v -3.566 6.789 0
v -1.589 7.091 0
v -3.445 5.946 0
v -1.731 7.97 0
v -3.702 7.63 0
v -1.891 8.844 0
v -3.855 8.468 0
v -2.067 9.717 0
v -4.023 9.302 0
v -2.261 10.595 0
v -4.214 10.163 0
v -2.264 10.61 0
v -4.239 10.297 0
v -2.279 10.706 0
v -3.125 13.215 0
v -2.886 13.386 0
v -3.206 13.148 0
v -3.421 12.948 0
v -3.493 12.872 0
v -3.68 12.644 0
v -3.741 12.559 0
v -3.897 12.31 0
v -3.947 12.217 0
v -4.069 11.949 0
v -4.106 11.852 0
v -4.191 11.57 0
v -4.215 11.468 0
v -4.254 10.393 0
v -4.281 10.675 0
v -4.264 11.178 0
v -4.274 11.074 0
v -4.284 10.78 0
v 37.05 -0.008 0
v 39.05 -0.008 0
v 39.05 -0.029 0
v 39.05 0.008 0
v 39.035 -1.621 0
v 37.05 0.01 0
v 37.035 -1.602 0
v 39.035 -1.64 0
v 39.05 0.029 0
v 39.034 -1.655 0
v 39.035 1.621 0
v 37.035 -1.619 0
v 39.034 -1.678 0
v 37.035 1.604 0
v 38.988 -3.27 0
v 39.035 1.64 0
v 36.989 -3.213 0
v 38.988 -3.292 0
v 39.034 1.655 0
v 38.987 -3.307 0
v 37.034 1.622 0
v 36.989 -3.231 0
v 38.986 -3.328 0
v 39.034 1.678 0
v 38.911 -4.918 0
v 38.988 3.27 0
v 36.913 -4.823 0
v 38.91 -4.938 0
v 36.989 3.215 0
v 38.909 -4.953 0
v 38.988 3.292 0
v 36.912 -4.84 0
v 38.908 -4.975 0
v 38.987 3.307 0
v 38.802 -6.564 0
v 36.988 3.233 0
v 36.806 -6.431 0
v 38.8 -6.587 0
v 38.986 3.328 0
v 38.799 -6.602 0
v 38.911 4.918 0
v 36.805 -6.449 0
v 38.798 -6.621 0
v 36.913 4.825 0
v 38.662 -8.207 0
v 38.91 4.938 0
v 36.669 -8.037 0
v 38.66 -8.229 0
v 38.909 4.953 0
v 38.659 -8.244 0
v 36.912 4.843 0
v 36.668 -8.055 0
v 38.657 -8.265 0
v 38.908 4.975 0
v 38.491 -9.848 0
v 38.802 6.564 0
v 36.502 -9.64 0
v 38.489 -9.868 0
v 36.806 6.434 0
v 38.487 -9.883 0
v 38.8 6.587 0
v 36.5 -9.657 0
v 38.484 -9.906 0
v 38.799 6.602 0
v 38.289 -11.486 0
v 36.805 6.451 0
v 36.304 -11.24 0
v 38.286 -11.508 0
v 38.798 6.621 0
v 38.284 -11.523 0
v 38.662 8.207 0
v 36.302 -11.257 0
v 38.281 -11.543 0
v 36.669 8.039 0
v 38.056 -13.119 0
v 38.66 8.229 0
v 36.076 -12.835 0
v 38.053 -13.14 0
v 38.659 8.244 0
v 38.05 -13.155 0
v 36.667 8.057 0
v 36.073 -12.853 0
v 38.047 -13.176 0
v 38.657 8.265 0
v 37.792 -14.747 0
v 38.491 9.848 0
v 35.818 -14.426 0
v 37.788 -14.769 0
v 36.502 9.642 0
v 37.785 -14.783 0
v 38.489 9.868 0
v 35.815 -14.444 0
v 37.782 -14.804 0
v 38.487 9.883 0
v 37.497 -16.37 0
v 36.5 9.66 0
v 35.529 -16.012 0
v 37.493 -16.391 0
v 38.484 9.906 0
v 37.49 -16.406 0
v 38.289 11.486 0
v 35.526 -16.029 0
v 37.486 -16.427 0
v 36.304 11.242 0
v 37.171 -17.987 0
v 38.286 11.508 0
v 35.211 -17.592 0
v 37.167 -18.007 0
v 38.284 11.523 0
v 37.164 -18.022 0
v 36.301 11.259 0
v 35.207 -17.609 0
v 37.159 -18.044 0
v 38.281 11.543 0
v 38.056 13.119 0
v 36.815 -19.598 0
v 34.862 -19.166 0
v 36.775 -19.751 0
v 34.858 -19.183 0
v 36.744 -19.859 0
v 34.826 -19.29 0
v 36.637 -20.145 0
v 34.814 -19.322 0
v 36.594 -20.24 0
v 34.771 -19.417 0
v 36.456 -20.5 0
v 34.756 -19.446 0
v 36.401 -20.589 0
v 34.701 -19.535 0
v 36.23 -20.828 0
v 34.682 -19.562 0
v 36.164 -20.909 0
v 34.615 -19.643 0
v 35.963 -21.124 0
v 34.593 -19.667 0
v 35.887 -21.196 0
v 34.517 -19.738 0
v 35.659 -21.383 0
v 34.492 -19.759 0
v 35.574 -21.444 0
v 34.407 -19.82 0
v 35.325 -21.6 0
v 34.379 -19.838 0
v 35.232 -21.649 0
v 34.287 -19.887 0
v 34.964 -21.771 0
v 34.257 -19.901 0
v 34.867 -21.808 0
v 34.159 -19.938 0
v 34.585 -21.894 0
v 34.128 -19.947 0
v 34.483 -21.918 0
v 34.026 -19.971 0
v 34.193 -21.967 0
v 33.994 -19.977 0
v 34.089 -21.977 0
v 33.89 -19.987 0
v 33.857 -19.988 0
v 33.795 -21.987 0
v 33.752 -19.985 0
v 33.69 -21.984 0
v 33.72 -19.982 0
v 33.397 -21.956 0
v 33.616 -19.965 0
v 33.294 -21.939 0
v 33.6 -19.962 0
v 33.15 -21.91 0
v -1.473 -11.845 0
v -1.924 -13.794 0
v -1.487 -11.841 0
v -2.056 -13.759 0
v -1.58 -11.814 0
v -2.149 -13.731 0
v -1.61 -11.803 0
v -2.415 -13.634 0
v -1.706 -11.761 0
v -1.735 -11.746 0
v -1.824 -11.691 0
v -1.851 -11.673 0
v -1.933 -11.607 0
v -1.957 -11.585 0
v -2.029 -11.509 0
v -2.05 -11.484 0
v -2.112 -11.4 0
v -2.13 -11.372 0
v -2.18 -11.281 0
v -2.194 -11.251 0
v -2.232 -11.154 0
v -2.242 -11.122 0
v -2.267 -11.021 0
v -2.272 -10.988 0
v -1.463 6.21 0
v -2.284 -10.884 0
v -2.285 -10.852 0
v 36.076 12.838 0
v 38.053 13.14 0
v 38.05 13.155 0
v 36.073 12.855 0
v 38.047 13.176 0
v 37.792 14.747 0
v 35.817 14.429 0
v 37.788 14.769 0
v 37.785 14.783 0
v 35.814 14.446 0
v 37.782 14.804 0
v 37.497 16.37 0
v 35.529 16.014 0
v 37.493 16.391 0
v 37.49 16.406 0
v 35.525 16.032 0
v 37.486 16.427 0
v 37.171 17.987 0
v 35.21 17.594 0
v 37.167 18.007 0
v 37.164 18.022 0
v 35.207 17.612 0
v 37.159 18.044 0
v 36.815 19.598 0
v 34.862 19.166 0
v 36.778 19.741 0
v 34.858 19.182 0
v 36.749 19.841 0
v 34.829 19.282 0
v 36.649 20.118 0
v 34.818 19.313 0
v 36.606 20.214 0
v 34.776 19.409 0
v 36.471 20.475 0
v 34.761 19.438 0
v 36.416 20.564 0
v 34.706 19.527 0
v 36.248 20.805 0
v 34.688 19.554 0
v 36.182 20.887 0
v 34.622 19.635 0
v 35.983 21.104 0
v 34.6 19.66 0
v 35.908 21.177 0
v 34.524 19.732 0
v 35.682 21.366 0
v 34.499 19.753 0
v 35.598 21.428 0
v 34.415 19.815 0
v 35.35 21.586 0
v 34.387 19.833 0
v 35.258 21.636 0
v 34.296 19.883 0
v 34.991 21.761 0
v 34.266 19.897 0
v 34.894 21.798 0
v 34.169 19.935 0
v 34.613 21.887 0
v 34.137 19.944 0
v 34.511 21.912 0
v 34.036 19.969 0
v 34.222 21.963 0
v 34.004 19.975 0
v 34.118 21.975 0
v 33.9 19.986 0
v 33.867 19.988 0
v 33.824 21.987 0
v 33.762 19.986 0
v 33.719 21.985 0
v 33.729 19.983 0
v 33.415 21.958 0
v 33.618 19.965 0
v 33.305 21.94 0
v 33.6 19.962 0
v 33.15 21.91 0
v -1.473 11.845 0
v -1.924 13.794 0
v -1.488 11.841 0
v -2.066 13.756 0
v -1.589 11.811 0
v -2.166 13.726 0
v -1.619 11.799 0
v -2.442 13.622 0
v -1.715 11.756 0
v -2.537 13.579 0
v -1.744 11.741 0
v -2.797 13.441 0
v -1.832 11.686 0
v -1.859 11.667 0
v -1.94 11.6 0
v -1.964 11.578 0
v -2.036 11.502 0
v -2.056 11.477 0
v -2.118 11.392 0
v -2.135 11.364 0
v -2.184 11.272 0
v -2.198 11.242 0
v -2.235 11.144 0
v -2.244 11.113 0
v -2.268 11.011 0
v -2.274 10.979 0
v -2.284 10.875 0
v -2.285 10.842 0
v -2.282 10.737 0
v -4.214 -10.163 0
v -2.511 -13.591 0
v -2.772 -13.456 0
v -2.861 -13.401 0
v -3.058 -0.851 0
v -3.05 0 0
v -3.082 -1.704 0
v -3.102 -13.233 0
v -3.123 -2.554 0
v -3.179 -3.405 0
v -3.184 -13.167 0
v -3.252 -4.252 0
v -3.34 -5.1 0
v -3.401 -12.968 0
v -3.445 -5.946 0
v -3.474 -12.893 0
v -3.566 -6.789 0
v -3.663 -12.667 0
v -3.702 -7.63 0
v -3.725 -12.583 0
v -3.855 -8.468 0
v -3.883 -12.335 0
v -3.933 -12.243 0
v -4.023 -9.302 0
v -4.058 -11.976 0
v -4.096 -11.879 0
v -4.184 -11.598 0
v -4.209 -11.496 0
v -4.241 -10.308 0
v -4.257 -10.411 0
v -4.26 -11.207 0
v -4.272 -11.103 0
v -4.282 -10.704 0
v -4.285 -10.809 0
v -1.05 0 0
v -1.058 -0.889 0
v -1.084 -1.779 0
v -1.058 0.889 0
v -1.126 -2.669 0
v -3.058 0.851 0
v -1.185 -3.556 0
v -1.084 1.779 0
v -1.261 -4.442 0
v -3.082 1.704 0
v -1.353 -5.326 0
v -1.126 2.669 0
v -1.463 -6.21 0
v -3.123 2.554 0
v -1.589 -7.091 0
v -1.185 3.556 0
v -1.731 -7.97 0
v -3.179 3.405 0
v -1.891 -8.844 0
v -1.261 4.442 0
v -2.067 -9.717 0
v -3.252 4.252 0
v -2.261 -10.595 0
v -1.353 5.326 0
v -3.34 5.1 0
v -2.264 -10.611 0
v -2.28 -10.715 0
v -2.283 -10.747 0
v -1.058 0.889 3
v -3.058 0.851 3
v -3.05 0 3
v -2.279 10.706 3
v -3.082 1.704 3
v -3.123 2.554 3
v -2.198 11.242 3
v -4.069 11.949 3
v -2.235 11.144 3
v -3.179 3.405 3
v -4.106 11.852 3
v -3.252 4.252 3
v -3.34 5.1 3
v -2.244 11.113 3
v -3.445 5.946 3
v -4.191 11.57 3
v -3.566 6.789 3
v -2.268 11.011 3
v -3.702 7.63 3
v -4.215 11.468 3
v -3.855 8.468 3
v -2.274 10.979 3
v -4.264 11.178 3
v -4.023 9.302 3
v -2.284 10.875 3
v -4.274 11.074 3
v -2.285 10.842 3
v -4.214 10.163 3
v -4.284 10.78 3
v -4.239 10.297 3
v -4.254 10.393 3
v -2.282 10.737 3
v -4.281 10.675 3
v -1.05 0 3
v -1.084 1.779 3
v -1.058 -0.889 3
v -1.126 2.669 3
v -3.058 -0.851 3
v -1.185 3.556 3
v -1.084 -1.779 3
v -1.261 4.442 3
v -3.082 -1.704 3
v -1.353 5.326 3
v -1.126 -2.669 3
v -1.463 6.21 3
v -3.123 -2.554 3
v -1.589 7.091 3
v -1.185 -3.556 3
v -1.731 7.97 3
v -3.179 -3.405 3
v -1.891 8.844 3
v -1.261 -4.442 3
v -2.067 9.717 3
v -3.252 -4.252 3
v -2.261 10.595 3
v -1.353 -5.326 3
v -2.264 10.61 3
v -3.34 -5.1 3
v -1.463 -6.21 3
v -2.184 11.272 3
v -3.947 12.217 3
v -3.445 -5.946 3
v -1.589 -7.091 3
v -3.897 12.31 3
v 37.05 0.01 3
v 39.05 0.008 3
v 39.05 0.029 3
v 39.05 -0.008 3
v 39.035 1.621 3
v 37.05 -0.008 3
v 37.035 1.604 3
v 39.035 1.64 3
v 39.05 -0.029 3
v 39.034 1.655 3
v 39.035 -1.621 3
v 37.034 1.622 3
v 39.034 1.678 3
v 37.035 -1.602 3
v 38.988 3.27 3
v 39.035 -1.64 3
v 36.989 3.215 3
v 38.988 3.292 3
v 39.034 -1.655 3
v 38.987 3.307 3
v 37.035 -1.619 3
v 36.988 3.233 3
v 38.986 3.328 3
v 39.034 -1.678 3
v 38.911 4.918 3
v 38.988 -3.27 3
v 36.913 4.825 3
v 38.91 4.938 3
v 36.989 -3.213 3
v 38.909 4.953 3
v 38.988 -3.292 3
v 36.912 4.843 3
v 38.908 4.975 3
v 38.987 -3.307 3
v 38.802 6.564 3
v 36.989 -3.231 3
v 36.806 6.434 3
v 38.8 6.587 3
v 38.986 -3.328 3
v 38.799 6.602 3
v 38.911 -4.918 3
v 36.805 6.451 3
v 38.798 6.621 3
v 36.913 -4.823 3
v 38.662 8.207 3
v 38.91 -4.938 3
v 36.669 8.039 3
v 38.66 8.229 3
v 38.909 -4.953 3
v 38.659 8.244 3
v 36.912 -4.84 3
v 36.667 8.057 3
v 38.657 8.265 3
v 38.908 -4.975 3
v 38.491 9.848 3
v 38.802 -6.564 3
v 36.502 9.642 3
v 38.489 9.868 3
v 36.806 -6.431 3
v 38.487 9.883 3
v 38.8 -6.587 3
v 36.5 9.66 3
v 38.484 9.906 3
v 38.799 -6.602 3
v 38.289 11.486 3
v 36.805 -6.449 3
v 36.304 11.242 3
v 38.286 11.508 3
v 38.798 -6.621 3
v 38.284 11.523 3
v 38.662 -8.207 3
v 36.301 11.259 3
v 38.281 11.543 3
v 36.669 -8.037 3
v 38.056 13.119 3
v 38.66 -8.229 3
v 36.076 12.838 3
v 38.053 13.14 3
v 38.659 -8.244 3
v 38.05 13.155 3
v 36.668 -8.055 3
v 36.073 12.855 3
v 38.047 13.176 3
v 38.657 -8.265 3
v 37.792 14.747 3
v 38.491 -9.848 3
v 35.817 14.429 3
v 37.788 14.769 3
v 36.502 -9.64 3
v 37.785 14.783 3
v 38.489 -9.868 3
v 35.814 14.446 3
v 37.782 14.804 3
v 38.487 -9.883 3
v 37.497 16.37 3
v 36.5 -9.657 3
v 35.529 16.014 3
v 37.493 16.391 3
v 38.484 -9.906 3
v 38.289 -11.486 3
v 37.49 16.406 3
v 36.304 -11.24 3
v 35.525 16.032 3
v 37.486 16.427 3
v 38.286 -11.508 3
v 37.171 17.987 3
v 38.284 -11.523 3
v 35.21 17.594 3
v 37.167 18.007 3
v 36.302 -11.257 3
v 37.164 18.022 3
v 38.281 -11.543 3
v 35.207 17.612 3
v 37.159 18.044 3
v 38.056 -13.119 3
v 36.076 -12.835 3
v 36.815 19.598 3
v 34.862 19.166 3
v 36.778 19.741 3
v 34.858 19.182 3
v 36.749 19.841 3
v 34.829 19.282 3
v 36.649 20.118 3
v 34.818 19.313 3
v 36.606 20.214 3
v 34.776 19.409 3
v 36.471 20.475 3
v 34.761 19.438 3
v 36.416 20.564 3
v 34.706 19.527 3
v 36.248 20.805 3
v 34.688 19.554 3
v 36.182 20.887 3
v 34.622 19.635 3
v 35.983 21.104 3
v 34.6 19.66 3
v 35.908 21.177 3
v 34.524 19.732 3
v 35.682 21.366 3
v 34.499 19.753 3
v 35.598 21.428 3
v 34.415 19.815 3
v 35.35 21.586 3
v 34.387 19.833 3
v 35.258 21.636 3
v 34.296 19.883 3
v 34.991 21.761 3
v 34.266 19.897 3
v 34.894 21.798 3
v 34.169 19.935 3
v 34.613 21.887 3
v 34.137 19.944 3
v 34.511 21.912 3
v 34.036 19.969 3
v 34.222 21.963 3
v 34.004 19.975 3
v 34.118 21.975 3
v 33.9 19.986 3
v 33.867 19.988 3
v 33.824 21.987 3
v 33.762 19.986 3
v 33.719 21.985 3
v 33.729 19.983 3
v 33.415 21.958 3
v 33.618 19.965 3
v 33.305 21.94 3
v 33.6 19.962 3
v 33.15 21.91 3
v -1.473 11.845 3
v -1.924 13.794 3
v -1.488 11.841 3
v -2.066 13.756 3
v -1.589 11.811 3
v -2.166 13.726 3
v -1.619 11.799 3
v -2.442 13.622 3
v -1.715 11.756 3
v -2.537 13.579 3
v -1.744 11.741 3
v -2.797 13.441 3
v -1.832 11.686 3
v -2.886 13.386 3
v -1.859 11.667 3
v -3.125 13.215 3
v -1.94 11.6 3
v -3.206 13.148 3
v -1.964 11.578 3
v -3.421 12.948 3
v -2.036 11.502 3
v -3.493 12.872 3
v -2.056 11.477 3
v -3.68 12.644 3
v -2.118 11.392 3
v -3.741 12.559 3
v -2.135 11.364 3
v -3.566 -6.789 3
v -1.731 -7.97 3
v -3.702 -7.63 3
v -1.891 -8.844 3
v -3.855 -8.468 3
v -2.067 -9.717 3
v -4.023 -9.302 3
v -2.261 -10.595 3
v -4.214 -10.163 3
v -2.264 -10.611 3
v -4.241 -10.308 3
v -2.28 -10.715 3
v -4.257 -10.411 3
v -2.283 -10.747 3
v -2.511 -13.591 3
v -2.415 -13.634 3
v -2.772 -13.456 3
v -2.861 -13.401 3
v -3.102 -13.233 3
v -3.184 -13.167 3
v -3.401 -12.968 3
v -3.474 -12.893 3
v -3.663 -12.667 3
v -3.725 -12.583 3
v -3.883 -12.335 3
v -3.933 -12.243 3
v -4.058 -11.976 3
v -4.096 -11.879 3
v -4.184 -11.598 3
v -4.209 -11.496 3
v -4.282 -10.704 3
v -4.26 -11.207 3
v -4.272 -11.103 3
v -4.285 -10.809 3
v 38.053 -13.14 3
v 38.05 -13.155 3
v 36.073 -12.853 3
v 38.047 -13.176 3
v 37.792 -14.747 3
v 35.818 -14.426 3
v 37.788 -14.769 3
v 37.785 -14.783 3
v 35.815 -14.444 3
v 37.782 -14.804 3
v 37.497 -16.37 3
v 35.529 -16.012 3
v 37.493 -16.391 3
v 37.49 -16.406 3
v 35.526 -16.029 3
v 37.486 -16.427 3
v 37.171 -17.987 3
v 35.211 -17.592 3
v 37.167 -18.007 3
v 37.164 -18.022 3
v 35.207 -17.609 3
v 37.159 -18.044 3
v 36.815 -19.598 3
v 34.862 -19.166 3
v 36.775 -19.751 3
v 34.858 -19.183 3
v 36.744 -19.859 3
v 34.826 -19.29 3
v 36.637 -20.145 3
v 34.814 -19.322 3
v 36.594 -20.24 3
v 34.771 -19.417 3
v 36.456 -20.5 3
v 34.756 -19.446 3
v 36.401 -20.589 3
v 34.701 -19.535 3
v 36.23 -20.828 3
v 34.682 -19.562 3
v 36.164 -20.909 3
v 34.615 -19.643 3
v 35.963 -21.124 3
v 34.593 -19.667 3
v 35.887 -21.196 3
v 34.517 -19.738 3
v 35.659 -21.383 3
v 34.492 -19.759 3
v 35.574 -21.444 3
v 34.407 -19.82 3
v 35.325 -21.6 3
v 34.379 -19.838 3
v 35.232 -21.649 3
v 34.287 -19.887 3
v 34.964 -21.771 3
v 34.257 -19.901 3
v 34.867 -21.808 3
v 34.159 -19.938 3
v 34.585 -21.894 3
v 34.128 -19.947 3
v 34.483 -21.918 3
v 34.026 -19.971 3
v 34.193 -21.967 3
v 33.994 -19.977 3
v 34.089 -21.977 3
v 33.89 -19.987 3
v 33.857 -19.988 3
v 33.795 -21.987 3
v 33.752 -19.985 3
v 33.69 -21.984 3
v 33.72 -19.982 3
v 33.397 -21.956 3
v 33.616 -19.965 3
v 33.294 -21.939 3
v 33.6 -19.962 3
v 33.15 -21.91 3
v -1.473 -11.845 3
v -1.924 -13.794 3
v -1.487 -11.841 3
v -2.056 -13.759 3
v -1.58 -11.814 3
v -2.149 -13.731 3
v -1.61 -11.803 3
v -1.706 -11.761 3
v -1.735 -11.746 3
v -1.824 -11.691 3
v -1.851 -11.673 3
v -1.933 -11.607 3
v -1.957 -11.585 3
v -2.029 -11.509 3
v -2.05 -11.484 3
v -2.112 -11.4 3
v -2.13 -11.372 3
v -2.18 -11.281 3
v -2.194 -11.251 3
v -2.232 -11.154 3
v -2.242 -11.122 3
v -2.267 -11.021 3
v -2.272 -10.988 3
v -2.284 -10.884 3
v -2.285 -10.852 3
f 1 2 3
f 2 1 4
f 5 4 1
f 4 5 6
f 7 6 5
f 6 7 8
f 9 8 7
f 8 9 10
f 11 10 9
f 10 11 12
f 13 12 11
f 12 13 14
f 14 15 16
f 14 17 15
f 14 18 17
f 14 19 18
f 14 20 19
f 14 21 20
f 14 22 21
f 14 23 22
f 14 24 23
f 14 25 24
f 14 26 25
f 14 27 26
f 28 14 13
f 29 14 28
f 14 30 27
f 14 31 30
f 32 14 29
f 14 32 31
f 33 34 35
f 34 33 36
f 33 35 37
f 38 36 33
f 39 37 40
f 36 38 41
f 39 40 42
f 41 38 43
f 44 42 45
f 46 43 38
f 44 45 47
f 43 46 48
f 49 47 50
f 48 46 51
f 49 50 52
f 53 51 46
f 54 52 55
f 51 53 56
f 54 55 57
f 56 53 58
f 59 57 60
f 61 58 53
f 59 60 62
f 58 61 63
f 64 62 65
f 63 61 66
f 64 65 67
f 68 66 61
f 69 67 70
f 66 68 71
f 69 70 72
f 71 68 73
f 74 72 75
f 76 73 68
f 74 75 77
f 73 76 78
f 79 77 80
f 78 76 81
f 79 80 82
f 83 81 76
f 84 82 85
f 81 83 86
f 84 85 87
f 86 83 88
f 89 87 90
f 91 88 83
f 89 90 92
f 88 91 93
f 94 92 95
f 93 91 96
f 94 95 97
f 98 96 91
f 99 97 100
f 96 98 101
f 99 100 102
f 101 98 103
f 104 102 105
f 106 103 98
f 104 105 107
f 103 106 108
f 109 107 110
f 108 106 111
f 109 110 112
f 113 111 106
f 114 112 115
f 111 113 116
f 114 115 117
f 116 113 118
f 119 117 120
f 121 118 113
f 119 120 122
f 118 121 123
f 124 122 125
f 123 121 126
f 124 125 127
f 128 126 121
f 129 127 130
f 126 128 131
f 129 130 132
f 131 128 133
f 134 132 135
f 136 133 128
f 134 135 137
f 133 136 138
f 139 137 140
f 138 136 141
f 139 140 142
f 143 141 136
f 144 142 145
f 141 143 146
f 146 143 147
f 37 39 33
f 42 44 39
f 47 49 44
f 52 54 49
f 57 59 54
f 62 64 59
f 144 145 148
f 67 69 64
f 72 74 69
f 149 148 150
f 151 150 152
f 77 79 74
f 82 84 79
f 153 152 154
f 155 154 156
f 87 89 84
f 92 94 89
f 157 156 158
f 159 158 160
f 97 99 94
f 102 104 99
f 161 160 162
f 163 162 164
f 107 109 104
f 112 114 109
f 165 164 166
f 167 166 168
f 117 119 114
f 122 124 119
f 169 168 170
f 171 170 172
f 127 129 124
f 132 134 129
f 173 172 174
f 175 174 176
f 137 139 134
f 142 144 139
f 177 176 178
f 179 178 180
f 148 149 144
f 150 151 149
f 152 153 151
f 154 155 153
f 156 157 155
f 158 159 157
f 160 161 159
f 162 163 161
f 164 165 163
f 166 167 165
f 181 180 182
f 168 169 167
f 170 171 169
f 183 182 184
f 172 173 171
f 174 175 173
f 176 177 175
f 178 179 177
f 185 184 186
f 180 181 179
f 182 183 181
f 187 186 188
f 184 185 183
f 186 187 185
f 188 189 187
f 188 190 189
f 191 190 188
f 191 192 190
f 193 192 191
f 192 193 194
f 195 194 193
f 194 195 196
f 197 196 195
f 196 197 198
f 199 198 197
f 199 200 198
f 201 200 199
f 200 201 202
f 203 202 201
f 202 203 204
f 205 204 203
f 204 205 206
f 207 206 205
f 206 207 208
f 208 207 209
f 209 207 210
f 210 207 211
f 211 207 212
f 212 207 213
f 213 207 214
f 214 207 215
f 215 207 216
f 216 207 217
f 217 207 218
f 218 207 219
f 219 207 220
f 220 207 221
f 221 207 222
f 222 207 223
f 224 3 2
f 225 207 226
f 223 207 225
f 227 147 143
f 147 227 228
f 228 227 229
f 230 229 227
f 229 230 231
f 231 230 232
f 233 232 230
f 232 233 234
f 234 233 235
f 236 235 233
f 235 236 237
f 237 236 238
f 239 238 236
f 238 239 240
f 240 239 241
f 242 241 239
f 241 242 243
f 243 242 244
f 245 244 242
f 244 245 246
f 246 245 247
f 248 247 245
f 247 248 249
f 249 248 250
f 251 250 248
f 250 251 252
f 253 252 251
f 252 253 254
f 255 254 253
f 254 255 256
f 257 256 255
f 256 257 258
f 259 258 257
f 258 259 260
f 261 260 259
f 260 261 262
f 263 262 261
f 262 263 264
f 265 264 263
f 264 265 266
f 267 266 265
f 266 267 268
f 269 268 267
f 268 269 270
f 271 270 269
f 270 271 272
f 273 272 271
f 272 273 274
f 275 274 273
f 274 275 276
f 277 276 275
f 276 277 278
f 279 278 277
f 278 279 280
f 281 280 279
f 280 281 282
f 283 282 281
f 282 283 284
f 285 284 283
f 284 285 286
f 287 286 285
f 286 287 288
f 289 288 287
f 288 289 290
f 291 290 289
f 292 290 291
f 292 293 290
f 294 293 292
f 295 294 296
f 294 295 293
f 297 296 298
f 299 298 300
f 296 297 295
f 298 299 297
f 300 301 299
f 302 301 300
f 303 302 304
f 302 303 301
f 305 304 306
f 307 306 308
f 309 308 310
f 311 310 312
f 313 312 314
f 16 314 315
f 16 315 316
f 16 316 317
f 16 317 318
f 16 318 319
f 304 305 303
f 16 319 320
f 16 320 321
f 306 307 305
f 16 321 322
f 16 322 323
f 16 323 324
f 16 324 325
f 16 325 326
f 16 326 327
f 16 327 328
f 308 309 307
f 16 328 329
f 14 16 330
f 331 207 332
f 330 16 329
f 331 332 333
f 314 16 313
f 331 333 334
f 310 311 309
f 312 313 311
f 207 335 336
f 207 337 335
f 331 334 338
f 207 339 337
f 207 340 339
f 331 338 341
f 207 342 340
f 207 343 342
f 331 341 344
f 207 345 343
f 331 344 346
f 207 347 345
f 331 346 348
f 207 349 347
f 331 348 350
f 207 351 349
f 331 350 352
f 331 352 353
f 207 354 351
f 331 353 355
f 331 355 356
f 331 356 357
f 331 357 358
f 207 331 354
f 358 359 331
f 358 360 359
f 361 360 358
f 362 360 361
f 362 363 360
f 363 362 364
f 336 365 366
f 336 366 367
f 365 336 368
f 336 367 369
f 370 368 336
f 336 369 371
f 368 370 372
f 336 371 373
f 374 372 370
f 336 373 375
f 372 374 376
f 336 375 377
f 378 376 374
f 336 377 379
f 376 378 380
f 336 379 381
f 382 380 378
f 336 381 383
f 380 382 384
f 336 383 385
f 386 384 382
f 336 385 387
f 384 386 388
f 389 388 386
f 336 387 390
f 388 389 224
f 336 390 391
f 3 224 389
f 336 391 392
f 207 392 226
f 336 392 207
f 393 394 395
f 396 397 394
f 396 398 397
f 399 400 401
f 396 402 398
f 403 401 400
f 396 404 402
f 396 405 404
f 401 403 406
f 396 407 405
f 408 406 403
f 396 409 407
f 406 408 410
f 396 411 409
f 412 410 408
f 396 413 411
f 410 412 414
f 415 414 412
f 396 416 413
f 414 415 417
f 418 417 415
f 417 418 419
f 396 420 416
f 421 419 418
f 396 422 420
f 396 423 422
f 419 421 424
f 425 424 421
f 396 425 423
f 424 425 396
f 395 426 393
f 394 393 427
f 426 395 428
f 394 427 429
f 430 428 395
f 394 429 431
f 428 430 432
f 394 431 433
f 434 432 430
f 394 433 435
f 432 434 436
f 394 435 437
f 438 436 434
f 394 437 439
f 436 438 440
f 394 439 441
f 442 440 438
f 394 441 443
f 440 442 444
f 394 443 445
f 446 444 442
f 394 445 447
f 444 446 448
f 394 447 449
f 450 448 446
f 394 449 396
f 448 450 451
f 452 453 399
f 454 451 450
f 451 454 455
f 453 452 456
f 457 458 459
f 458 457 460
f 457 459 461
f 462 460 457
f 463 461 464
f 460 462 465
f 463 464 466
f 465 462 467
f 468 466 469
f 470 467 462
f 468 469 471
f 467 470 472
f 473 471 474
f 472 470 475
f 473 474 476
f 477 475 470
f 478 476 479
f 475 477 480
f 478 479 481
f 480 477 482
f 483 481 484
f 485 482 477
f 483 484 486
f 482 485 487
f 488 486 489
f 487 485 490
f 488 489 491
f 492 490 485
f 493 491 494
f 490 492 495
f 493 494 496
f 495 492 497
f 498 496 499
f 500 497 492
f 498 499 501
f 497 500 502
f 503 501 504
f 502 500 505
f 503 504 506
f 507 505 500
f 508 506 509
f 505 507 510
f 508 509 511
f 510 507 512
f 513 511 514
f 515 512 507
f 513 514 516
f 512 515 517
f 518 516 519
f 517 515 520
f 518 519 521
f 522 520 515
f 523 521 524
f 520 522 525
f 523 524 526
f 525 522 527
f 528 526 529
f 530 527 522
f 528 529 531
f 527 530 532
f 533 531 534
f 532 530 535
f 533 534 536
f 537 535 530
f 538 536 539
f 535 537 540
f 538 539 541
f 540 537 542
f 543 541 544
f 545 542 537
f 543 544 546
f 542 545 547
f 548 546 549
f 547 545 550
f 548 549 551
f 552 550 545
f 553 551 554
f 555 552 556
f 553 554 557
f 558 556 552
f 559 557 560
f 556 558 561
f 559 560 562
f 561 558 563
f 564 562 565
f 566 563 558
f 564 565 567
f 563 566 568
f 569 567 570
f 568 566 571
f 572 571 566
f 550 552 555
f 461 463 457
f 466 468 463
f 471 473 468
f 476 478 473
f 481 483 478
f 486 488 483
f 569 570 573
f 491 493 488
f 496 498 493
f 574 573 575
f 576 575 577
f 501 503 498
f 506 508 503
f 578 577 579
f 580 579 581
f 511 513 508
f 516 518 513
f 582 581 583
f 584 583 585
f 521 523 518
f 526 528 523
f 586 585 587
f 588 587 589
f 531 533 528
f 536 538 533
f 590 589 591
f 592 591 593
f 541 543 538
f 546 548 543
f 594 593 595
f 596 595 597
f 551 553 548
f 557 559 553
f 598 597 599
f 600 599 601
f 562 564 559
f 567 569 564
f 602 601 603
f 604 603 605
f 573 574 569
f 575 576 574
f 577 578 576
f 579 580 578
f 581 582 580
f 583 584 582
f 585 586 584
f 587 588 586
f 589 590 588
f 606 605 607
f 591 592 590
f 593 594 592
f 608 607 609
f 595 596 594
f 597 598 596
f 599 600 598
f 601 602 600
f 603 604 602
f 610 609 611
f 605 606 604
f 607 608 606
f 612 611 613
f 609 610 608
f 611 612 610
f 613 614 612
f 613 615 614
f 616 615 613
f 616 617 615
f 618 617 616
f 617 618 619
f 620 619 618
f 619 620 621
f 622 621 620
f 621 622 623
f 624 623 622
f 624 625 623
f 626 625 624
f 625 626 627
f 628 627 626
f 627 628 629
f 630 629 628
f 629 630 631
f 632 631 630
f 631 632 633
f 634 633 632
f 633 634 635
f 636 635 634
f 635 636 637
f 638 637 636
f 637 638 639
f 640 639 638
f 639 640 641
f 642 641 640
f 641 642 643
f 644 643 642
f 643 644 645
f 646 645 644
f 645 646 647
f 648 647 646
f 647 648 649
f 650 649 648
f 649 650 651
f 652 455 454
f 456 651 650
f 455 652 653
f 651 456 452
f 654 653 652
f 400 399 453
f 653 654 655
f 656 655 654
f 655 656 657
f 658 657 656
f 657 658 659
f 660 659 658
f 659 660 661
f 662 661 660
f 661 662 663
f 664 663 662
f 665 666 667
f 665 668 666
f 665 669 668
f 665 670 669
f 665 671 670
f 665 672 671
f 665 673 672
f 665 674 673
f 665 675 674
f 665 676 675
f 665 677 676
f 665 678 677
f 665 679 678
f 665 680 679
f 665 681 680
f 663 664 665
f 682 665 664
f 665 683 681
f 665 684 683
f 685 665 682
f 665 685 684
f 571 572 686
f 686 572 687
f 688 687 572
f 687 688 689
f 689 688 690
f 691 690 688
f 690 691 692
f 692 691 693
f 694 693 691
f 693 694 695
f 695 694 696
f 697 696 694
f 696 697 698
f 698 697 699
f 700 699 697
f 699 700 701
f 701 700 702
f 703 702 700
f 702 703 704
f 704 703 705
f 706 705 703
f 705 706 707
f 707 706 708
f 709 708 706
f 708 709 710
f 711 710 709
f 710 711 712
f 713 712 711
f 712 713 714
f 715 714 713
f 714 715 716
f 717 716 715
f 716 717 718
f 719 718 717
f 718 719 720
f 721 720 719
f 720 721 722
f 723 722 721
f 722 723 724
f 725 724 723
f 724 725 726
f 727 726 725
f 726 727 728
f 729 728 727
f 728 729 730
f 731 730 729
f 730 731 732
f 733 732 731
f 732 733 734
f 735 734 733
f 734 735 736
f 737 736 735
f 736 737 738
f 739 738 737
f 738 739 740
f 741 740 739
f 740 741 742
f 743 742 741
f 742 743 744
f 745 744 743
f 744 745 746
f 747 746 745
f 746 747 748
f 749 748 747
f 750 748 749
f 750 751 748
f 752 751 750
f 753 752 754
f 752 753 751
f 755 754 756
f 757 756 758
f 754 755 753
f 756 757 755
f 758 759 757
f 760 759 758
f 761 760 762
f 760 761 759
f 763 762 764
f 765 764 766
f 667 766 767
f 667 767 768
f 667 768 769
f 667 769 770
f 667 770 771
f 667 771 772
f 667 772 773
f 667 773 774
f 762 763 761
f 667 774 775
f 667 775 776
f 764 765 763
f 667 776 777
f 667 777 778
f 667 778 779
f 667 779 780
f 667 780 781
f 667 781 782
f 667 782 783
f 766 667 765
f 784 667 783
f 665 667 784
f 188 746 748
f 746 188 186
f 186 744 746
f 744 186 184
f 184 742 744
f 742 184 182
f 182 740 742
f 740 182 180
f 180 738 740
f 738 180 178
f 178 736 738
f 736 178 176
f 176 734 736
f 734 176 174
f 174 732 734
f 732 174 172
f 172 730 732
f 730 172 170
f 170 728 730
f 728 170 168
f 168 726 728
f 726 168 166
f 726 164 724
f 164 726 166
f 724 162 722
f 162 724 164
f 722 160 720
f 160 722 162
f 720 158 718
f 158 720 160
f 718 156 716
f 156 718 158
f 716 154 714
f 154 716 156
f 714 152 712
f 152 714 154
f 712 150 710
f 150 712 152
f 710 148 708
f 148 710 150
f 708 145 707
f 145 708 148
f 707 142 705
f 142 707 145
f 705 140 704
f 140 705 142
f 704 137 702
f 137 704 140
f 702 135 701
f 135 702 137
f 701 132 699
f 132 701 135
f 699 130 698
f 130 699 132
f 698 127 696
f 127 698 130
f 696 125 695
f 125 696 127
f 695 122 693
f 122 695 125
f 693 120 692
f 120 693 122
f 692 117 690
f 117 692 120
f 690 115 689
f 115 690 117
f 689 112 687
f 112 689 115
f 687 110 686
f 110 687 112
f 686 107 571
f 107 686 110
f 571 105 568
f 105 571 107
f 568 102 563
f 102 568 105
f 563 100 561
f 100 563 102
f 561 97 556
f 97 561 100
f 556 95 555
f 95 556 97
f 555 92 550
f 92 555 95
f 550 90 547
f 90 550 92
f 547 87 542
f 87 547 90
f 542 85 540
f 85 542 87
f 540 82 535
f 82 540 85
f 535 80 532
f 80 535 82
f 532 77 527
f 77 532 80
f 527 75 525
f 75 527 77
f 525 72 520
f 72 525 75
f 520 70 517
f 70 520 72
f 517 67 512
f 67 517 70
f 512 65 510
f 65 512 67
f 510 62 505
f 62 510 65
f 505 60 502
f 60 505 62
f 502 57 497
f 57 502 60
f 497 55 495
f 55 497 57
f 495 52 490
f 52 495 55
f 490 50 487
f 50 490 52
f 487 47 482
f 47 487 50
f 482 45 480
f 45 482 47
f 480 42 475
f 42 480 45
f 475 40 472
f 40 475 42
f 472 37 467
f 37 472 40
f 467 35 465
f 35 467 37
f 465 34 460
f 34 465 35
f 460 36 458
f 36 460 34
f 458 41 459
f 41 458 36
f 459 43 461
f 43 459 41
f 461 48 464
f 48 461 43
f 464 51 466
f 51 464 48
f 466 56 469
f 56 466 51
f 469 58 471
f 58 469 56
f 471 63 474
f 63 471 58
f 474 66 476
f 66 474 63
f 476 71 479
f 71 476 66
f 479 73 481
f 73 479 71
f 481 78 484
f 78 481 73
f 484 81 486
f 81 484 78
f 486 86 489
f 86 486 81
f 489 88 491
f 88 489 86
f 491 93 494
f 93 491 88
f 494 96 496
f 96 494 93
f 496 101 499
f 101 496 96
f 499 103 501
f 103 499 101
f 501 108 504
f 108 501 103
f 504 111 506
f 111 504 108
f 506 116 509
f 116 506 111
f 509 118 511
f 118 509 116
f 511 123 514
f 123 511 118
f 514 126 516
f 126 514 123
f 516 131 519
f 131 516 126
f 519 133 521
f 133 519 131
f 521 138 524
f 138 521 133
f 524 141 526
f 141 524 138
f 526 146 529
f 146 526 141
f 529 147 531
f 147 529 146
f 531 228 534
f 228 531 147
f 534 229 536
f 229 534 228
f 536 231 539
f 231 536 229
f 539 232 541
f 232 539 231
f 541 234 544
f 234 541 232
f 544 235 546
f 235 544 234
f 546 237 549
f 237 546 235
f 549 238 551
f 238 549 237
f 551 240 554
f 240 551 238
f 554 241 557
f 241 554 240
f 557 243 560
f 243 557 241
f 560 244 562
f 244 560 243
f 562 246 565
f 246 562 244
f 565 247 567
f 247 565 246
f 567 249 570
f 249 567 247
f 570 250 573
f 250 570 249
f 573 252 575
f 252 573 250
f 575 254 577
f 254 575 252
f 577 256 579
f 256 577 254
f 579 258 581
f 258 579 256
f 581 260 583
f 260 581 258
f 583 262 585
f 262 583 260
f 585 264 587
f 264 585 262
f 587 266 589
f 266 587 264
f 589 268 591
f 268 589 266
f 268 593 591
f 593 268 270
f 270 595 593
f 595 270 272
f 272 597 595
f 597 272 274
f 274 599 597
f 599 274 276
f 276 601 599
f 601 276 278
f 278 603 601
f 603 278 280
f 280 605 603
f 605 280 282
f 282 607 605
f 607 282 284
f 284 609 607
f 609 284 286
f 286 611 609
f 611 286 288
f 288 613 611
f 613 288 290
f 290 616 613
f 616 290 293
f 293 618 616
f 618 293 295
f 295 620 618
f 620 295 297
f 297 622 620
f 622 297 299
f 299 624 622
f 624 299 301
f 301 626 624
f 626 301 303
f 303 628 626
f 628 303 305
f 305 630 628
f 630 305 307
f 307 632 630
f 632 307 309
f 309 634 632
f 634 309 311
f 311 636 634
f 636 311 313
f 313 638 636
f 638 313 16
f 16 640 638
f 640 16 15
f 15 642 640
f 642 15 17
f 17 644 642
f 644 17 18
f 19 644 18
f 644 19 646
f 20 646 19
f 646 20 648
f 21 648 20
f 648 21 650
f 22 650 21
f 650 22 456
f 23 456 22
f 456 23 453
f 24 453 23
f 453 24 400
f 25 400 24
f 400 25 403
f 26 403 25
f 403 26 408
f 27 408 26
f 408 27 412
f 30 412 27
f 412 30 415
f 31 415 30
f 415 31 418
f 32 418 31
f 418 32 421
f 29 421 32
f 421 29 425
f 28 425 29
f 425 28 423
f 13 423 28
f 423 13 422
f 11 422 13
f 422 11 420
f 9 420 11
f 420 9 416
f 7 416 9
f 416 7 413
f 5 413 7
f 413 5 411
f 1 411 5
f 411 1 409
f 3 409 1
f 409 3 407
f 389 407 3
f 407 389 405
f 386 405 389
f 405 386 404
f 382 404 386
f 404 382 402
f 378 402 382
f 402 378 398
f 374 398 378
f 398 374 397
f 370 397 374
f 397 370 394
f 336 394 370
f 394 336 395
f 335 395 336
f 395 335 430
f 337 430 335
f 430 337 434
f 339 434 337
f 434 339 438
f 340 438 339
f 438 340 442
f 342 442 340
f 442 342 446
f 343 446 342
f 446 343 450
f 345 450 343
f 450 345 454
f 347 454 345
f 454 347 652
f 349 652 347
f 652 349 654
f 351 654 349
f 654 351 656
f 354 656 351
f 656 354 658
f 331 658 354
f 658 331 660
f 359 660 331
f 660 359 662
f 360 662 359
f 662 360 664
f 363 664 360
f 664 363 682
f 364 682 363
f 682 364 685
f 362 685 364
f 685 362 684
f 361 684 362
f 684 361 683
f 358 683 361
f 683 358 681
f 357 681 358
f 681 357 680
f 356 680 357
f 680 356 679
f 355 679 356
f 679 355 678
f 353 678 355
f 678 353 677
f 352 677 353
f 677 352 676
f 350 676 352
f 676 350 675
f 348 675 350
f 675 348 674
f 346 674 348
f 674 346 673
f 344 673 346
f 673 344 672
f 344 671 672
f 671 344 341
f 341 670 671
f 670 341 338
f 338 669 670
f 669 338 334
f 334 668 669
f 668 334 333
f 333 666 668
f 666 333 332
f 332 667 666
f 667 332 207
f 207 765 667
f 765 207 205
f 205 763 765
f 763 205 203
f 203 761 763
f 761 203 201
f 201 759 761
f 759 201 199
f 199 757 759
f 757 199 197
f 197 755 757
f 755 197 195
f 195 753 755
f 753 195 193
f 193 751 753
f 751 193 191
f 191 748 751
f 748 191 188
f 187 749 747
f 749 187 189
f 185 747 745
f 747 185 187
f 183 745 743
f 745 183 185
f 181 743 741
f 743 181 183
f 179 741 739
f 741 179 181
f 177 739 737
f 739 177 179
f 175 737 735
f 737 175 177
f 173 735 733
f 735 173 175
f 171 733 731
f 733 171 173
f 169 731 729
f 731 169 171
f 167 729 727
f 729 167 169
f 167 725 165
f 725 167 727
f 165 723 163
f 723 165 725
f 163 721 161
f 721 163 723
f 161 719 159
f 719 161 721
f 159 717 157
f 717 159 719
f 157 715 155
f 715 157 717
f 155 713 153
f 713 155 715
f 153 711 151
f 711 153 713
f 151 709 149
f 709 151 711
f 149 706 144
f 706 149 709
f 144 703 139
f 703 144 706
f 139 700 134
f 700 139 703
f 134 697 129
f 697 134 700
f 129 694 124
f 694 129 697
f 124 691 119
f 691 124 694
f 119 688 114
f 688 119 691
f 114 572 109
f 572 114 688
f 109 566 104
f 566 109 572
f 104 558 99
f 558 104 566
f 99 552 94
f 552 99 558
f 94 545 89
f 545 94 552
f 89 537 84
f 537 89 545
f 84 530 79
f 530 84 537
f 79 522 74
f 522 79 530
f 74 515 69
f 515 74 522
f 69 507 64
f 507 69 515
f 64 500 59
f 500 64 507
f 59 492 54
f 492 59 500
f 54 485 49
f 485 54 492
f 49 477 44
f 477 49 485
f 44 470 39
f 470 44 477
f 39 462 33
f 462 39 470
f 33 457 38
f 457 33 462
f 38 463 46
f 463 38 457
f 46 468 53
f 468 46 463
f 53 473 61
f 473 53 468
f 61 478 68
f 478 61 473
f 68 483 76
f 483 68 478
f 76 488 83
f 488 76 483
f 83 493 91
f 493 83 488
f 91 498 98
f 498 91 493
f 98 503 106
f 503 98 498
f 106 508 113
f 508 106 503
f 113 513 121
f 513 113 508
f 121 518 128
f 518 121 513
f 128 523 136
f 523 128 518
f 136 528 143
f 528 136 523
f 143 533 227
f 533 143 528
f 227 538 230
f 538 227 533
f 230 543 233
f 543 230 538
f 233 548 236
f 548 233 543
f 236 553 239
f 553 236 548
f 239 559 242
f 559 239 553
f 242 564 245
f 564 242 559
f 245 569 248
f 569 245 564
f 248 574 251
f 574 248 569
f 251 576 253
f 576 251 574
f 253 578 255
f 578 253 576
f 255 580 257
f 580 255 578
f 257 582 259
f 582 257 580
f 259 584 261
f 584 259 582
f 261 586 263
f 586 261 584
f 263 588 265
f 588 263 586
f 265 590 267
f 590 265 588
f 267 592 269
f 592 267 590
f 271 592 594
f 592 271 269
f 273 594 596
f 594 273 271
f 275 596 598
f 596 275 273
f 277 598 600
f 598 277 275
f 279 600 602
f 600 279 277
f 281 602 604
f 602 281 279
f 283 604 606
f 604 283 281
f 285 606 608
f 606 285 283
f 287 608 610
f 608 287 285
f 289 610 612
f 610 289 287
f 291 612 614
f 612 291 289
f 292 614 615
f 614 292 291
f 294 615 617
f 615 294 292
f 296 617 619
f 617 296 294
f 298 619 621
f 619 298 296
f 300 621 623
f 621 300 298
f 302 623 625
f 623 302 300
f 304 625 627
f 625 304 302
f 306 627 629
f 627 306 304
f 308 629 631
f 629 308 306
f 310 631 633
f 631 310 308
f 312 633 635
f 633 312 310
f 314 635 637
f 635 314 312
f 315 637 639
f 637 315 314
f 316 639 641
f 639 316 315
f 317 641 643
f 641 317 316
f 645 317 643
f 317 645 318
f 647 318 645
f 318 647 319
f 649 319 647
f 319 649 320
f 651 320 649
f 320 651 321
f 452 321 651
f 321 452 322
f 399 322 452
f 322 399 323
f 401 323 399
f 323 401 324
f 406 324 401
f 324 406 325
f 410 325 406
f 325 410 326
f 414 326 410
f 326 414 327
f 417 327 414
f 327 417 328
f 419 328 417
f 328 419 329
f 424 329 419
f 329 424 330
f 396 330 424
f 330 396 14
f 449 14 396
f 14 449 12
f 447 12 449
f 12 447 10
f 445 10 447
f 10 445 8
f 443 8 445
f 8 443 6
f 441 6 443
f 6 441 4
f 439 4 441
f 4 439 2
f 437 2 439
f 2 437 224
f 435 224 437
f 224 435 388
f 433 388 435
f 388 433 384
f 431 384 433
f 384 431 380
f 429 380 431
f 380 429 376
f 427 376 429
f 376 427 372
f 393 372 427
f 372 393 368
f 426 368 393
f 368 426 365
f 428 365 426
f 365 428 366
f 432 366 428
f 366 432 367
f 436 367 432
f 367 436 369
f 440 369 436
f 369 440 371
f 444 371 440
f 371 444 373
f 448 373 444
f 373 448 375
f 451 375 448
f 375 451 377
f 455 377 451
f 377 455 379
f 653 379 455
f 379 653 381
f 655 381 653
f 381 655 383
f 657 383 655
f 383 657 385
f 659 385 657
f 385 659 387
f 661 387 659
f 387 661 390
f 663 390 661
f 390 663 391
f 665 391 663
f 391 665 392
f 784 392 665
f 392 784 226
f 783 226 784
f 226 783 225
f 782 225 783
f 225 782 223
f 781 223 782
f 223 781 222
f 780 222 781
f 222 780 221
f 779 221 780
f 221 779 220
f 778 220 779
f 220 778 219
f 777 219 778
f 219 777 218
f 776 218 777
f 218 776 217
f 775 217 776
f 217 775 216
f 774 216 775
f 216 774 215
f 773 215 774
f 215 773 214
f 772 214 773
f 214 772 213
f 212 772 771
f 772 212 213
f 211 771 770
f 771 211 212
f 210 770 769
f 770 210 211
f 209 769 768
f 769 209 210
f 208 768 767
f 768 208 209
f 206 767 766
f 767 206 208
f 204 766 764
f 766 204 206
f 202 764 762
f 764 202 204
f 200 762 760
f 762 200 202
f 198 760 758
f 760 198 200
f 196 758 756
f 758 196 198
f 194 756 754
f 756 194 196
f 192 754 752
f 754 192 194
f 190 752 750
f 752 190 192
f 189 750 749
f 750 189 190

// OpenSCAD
// file: parameters.scad
// =============================================================================
// Gen-BY — nightly 2026-10-11 (physics_scorer, honest magpylib watts)
// Stator-only upgrade for an existing Gen-BU: the R66 rotors and Ø158 steel are reused unchanged, and a new 12-bobbin stator with thinner 7.2 mm copper (gap 10.70 → 9.80 mm) and longer r48–84 bobbins (more copper outside the magnet ring) replaces the old one, together with a shorter gap sleeve and wider-spaced frame rods. It is the modular swap path: no new magnets or steel.
// Clocking 0 deg (magnets N facing S) + D-flat keyed bore + index notch + flip-symmetric hole map.
// Windable 2-piece bobbin; turns = physics_scorer turns_fit; copper only between flanges.
// Steel back-iron: 2× Ø158 × 4.76 mm (3/16") mild-steel discs (steel_backiron_disc.dxf); magnets sit ON the steel
// (through-pockets) -> score with --back-iron. Night 2026-10-11.
// =============================================================================
topology            = "dual_rotor";

// --- Wire / winding (physics_scorer winding-fit) -------------------------------
wire_awg            = 26;
wire_od             = 0.45;     // insulated OD mm (bare 0.405)
fill_realistic      = 0.65;     // insulated-wire area / window (DENSE layered wind with a jig; scorer cap 0.65)
turns               = 410;       // = physics_scorer turns_fit (do NOT raise)
coil_former_type    = "bobbin";
coil_core_inset     = 13.95;     // radial copper build: hub = copper boundary inset by this
wind_build_axial    = 0.0;      // nothing proud of the flanges
wind_build_radial   = 0.0;

// --- Bobbin (base + lid) ---------------------------------------------------------
coil_id_r           = 48.00;    // copper boundary sector
coil_od_r           = 84.00;
span_deg            = 26.06;    // = pitch - 2*asin((wall+0.85)/coil_id_r) -> >=1.2 mm stator web
former_web          = 7.20;     // copper height between flanges (TALL copper: steel keeps Bz up)
flange_t            = 0.80;     // >= 0.8 mm FDM wall rule (tall winds push on the flanges)
wall                = 0.80;     // flange lip beyond copper
former_bare_h       = former_web + 2 * flange_t;
coil_envelope_h     = former_bare_h + 2 * wind_build_axial;
tab_w               = 7.0;
tab_len             = 7.0;
tab_h               = former_bare_h / 2;
pin_d               = 1.9;      // 1.75 mm filament locating pin
coil_mount_r        = coil_od_r + 0.2 + 4.0;
lead_y              = 1.6;
lead_slot_w         = 0.9;
lead_groove_d       = 0.6;

// --- Gap -------------------------------------------------------------------------
run_clear           = 0.50;     // rotor face -> flange
gap_spacer_h        = run_clear + wind_build_axial;
m2m                 = coil_envelope_h + 2 * run_clear;   // rotor face to rotor face (= gap_sleeve length)

// --- Stator ----------------------------------------------------------------------
coil_stations       = 12;
bay_clear           = 0.25;
stator_thick        = former_bare_h;                        // bobbins flush both faces
stator_od           = 186.0;
shaft_clear_stator  = 14.0;     // stator is static; gap sleeve OD 12 spins inside

// --- Rotor(s) --------------------------------------------------------------------
magnet_Br           = 1.43;     // N52
magnet_d_large      = 20.0;
magnet_h_large      = 5.0;      // one O20x5 per pocket
magnet_h_small      = 5.0;      // unused: no O5 pockets in this kit
halbach_magnetisation = "none";  // NO O5 assist magnets in this kit (scan: they lower the 4-pole score)
rotor_b_same_axis   = true;     // same-index magnets share one axis: N faces S across the gap
large_pocket_d      = 20.3;
small_pocket_d      = 5.3;
pocket_h            = 5.00;     // THROUGH the carrier: magnet back face sits on the steel disc (FLUSH seat: carrier = magnet height, magnet face level with the rotor face)
large_n             = 8;
R_large             = 66.0;
small_r_list        = [];       // no O5 pockets
carrier_od          = 158.0;
carrier_thick       = pocket_h;
hub_h               = 12.0;     // > steel_t + insert: radial set-screw clears the steel
hub_od              = 24.0;     // slim hub so the M4 brace rods fit at R~18 inside the coil ring
hub_insert_d        = 4.0;      // M3 heat-set insert, radial, bears on the D-flat
rotor_b_offset_deg  = 0.0;      // CLOCKING: magnets directly opposite
shaft_key           = "dflat";
dflat_depth         = 0.5;      // 8 mm shaft with 0.5 mm flat (7.5 across flat)
index_notch_d       = 3.0;

// --- Steel back-iron (buyable laser-cut) -------------------------------------------
steel_t             = 4.76;      // mild steel thickness (image method ignores it; sized from steel_flux.py so the return path stays well below saturation)
steel_center_hole   = 26.0;     // slips over the rotor hub (OD 24)
steel_od            = carrier_od;   // steel disc OD = rotor carrier OD

// --- Modular MAX interface ----------------------------------------------------------
shaft_bore          = 8.35;
dflat_x             = 4.0 - dflat_depth + (shaft_bore - 8.0) / 2;
bearing_d           = 21.85;
bearing_h           = 7.2;
m3_clear            = 3.5;
bolt_r_inner        = 30.0;     // M3 steel-disc clamp bolts (inside the magnet ring)
bolt_n_inner        = 4;
bolt_inner_angles   = [0, 90, 180, 270];
bolt_r_outer        = 44.0;     // second M3 steel-disc clamp ring
bolt_outer_angles   = [67.5, 112.5, 247.5, 292.5];
flange_bolt_r       = 88.0;     // frame rods: OUTSIDE the rotor OD (rotors spin inside them)
flange_bolt_n       = 4;
flange_bolt_offset  = 45.00;    // between coil stations -> never cuts a lead groove/tab
brace_r             = 18.0;
brace_d             = 4.3;      // temporary M4 jack rods (assembly only)
brace_n             = 4;
brace_angles        = [45, 135, 225, 315];          // flip-symmetric

spacer_pad_od       = 14.0;
spacer_pad_id       = m3_clear;
endbell_od          = 186.0;
endbell_thick       = 8.0;
endbell_shaft_clear = 10.0;
collar_h            = 10.0;
standoff_od         = 9.0;
frame_standoff_h    = run_clear + carrier_thick + hub_h + collar_h + 2.0;
sleeve_od           = 12.0;
plate_max_mm        = 410;

$fn = 64;
// main file
// Gen-BY — fit coupon (bay part): O20/O5 THROUGH pockets at carrier thickness (test on a steel offcut), 608 seat,
// D-flat bore, gap shim, and one bobbin-bay slice (bobbin footprint + bay_clear) to test former fit.
include <parameters.scad>;
$fn = 48;
// D-flat keyed bore: flat faces +X (angle 0 = magnet pocket 0 = index notch)
module dflat_bore(h) {
    intersection() {
        cylinder(d=shaft_bore, h=h);
        translate([-shaft_bore, -shaft_bore, 0]) cube([shaft_bore + dflat_x, 2*shaft_bore, h]);
    }
}
module sector_2d(r_in, r_out, ang) {
    polygon([
        for (a = [-ang/2 : ang/24 : ang/2]) [r_in*cos(a), r_in*sin(a)],
        for (a = [ang/2 : -ang/24 : -ang/2]) [r_out*cos(a), r_out*sin(a)]
    ]);
}
module footprint_2d() { offset(r=wall) sector_2d(coil_id_r, coil_od_r, span_deg); }
module hub_2d()       { offset(delta=-coil_core_inset) sector_2d(coil_id_r, coil_od_r, span_deg); }

// bay slice: 3 mm tall ring section of the stator bay around one footprint (tests bobbin drop-in fit)
translate([-coil_id_r, 0, 0]) difference() {
    linear_extrude(3) offset(r=bay_clear + 2) footprint_2d();
    translate([0, 0, -0.1]) linear_extrude(3.2) offset(r=bay_clear) footprint_2d();
}
